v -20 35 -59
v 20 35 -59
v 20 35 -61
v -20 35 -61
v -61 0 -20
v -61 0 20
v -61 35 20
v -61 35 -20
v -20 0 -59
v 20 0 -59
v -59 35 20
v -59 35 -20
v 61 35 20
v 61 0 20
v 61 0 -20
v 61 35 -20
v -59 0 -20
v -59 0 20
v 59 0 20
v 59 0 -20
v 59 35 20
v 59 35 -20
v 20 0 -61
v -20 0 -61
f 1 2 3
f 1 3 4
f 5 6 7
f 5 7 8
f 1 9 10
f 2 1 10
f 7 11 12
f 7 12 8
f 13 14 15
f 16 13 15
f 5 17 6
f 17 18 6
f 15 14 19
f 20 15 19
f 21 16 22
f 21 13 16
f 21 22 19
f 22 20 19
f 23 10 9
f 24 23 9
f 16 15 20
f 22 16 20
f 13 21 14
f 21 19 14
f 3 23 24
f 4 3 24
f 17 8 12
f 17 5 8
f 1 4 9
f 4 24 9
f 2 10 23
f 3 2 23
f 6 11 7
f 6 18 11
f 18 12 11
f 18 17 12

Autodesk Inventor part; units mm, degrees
ref_plane "YZ Plane" through (0, 0, 0) normal (1, 0, 0) x (0, 1, 0)
ref_plane "XZ Plane" through (0, 0, 0) normal (0, 1, 0) x (-1, 0, 0)
ref_plane "XY Plane" through (0, 0, 0) normal (0, 0, 1) x (1, 0, 0)
sketch "Náčrt2" plane through (0, 0, 0) normal (0, 1, 0) x (-1, 0, 0)
  line L0 (61, -20) -> (59, -20)
  line L1 (59, -20) -> (59, 20)
  line L2 (59, 20) -> (61, 20)
  line L3 (61, 20) -> (61, -20)
  line L4 (75, -75) -> (75, 75)
  line L5 (45, 45) -> (45, -45)
  line L6 (75, 15) -> (45, 15)
  line L7 (75, -15) -> (45, -15)
  line L8 (0, 17.5556) -> (0, -18.0256) construction
  line L9 (-61, -20) -> (-59, -20)
  line L10 (-59, -20) -> (-59, 20)
  line L11 (-59, 20) -> (-61, 20)
  line L12 (-61, 20) -> (-61, -20)
  line L13 (-75, 15) -> (-45, 15)
  line L14 (-75, -15) -> (-45, -15)
  line L15 (75, 75) -> (-75, 75) construction
  line L16 (0, 0) -> (-75, 75) construction
  line L17 (-20, 59) -> (-20, 61)
  line L18 (-15, 75) -> (-15, 45)
  line L19 (20, 59) -> (-20, 59)
  line L20 (20, 61) -> (20, 59)
  line L21 (-20, 61) -> (20, 61)
  line L22 (15, 75) -> (15, 45)
  line L23 (20, 0) -> (-37.5, 0) construction
  line L24 (-20, -59) -> (-20, -61)
  line L25 (-15, -75) -> (-15, -45)
  line L26 (20, -59) -> (-20, -59)
  line L27 (20, -61) -> (20, -59)
  line L28 (-20, -61) -> (20, -61)
  line L29 (15, -75) -> (15, -45)
  point P0 (59, 0)
  point P1 (60, 20)
  point P2 (60, -20)
  point P3 (-59, 0)
  point P4 (-60, 20)
  point P5 (-60, -20)
  point P6 (0, 59)
  point P7 (20, 60)
  point P8 (-20, 60)
  point P9 (0, -59)
  point P10 (-20, -60)
  point P11 (20, -60)
  dimension "d0" = 2
  dimension "d1" = 14
  dimension "d2" = 14
  dimension "d3" = 5
  dimension "d4" = 5
extrude "Vysunutí1" add sketch "Náčrt2" along normal blind 35 contours L0 L1 L7 L3 | L7 L1 L6 L3 | L6 L1 L2 L3 | L12 L14 L10 L9 | L12 L13 L10 L14 | L12 L11 L10 L13 | L26 L25 L28 L24 | L26 L29 L28 L25 | L26 L27 L28 L29
properties part number "sklo" material "Sklo"
